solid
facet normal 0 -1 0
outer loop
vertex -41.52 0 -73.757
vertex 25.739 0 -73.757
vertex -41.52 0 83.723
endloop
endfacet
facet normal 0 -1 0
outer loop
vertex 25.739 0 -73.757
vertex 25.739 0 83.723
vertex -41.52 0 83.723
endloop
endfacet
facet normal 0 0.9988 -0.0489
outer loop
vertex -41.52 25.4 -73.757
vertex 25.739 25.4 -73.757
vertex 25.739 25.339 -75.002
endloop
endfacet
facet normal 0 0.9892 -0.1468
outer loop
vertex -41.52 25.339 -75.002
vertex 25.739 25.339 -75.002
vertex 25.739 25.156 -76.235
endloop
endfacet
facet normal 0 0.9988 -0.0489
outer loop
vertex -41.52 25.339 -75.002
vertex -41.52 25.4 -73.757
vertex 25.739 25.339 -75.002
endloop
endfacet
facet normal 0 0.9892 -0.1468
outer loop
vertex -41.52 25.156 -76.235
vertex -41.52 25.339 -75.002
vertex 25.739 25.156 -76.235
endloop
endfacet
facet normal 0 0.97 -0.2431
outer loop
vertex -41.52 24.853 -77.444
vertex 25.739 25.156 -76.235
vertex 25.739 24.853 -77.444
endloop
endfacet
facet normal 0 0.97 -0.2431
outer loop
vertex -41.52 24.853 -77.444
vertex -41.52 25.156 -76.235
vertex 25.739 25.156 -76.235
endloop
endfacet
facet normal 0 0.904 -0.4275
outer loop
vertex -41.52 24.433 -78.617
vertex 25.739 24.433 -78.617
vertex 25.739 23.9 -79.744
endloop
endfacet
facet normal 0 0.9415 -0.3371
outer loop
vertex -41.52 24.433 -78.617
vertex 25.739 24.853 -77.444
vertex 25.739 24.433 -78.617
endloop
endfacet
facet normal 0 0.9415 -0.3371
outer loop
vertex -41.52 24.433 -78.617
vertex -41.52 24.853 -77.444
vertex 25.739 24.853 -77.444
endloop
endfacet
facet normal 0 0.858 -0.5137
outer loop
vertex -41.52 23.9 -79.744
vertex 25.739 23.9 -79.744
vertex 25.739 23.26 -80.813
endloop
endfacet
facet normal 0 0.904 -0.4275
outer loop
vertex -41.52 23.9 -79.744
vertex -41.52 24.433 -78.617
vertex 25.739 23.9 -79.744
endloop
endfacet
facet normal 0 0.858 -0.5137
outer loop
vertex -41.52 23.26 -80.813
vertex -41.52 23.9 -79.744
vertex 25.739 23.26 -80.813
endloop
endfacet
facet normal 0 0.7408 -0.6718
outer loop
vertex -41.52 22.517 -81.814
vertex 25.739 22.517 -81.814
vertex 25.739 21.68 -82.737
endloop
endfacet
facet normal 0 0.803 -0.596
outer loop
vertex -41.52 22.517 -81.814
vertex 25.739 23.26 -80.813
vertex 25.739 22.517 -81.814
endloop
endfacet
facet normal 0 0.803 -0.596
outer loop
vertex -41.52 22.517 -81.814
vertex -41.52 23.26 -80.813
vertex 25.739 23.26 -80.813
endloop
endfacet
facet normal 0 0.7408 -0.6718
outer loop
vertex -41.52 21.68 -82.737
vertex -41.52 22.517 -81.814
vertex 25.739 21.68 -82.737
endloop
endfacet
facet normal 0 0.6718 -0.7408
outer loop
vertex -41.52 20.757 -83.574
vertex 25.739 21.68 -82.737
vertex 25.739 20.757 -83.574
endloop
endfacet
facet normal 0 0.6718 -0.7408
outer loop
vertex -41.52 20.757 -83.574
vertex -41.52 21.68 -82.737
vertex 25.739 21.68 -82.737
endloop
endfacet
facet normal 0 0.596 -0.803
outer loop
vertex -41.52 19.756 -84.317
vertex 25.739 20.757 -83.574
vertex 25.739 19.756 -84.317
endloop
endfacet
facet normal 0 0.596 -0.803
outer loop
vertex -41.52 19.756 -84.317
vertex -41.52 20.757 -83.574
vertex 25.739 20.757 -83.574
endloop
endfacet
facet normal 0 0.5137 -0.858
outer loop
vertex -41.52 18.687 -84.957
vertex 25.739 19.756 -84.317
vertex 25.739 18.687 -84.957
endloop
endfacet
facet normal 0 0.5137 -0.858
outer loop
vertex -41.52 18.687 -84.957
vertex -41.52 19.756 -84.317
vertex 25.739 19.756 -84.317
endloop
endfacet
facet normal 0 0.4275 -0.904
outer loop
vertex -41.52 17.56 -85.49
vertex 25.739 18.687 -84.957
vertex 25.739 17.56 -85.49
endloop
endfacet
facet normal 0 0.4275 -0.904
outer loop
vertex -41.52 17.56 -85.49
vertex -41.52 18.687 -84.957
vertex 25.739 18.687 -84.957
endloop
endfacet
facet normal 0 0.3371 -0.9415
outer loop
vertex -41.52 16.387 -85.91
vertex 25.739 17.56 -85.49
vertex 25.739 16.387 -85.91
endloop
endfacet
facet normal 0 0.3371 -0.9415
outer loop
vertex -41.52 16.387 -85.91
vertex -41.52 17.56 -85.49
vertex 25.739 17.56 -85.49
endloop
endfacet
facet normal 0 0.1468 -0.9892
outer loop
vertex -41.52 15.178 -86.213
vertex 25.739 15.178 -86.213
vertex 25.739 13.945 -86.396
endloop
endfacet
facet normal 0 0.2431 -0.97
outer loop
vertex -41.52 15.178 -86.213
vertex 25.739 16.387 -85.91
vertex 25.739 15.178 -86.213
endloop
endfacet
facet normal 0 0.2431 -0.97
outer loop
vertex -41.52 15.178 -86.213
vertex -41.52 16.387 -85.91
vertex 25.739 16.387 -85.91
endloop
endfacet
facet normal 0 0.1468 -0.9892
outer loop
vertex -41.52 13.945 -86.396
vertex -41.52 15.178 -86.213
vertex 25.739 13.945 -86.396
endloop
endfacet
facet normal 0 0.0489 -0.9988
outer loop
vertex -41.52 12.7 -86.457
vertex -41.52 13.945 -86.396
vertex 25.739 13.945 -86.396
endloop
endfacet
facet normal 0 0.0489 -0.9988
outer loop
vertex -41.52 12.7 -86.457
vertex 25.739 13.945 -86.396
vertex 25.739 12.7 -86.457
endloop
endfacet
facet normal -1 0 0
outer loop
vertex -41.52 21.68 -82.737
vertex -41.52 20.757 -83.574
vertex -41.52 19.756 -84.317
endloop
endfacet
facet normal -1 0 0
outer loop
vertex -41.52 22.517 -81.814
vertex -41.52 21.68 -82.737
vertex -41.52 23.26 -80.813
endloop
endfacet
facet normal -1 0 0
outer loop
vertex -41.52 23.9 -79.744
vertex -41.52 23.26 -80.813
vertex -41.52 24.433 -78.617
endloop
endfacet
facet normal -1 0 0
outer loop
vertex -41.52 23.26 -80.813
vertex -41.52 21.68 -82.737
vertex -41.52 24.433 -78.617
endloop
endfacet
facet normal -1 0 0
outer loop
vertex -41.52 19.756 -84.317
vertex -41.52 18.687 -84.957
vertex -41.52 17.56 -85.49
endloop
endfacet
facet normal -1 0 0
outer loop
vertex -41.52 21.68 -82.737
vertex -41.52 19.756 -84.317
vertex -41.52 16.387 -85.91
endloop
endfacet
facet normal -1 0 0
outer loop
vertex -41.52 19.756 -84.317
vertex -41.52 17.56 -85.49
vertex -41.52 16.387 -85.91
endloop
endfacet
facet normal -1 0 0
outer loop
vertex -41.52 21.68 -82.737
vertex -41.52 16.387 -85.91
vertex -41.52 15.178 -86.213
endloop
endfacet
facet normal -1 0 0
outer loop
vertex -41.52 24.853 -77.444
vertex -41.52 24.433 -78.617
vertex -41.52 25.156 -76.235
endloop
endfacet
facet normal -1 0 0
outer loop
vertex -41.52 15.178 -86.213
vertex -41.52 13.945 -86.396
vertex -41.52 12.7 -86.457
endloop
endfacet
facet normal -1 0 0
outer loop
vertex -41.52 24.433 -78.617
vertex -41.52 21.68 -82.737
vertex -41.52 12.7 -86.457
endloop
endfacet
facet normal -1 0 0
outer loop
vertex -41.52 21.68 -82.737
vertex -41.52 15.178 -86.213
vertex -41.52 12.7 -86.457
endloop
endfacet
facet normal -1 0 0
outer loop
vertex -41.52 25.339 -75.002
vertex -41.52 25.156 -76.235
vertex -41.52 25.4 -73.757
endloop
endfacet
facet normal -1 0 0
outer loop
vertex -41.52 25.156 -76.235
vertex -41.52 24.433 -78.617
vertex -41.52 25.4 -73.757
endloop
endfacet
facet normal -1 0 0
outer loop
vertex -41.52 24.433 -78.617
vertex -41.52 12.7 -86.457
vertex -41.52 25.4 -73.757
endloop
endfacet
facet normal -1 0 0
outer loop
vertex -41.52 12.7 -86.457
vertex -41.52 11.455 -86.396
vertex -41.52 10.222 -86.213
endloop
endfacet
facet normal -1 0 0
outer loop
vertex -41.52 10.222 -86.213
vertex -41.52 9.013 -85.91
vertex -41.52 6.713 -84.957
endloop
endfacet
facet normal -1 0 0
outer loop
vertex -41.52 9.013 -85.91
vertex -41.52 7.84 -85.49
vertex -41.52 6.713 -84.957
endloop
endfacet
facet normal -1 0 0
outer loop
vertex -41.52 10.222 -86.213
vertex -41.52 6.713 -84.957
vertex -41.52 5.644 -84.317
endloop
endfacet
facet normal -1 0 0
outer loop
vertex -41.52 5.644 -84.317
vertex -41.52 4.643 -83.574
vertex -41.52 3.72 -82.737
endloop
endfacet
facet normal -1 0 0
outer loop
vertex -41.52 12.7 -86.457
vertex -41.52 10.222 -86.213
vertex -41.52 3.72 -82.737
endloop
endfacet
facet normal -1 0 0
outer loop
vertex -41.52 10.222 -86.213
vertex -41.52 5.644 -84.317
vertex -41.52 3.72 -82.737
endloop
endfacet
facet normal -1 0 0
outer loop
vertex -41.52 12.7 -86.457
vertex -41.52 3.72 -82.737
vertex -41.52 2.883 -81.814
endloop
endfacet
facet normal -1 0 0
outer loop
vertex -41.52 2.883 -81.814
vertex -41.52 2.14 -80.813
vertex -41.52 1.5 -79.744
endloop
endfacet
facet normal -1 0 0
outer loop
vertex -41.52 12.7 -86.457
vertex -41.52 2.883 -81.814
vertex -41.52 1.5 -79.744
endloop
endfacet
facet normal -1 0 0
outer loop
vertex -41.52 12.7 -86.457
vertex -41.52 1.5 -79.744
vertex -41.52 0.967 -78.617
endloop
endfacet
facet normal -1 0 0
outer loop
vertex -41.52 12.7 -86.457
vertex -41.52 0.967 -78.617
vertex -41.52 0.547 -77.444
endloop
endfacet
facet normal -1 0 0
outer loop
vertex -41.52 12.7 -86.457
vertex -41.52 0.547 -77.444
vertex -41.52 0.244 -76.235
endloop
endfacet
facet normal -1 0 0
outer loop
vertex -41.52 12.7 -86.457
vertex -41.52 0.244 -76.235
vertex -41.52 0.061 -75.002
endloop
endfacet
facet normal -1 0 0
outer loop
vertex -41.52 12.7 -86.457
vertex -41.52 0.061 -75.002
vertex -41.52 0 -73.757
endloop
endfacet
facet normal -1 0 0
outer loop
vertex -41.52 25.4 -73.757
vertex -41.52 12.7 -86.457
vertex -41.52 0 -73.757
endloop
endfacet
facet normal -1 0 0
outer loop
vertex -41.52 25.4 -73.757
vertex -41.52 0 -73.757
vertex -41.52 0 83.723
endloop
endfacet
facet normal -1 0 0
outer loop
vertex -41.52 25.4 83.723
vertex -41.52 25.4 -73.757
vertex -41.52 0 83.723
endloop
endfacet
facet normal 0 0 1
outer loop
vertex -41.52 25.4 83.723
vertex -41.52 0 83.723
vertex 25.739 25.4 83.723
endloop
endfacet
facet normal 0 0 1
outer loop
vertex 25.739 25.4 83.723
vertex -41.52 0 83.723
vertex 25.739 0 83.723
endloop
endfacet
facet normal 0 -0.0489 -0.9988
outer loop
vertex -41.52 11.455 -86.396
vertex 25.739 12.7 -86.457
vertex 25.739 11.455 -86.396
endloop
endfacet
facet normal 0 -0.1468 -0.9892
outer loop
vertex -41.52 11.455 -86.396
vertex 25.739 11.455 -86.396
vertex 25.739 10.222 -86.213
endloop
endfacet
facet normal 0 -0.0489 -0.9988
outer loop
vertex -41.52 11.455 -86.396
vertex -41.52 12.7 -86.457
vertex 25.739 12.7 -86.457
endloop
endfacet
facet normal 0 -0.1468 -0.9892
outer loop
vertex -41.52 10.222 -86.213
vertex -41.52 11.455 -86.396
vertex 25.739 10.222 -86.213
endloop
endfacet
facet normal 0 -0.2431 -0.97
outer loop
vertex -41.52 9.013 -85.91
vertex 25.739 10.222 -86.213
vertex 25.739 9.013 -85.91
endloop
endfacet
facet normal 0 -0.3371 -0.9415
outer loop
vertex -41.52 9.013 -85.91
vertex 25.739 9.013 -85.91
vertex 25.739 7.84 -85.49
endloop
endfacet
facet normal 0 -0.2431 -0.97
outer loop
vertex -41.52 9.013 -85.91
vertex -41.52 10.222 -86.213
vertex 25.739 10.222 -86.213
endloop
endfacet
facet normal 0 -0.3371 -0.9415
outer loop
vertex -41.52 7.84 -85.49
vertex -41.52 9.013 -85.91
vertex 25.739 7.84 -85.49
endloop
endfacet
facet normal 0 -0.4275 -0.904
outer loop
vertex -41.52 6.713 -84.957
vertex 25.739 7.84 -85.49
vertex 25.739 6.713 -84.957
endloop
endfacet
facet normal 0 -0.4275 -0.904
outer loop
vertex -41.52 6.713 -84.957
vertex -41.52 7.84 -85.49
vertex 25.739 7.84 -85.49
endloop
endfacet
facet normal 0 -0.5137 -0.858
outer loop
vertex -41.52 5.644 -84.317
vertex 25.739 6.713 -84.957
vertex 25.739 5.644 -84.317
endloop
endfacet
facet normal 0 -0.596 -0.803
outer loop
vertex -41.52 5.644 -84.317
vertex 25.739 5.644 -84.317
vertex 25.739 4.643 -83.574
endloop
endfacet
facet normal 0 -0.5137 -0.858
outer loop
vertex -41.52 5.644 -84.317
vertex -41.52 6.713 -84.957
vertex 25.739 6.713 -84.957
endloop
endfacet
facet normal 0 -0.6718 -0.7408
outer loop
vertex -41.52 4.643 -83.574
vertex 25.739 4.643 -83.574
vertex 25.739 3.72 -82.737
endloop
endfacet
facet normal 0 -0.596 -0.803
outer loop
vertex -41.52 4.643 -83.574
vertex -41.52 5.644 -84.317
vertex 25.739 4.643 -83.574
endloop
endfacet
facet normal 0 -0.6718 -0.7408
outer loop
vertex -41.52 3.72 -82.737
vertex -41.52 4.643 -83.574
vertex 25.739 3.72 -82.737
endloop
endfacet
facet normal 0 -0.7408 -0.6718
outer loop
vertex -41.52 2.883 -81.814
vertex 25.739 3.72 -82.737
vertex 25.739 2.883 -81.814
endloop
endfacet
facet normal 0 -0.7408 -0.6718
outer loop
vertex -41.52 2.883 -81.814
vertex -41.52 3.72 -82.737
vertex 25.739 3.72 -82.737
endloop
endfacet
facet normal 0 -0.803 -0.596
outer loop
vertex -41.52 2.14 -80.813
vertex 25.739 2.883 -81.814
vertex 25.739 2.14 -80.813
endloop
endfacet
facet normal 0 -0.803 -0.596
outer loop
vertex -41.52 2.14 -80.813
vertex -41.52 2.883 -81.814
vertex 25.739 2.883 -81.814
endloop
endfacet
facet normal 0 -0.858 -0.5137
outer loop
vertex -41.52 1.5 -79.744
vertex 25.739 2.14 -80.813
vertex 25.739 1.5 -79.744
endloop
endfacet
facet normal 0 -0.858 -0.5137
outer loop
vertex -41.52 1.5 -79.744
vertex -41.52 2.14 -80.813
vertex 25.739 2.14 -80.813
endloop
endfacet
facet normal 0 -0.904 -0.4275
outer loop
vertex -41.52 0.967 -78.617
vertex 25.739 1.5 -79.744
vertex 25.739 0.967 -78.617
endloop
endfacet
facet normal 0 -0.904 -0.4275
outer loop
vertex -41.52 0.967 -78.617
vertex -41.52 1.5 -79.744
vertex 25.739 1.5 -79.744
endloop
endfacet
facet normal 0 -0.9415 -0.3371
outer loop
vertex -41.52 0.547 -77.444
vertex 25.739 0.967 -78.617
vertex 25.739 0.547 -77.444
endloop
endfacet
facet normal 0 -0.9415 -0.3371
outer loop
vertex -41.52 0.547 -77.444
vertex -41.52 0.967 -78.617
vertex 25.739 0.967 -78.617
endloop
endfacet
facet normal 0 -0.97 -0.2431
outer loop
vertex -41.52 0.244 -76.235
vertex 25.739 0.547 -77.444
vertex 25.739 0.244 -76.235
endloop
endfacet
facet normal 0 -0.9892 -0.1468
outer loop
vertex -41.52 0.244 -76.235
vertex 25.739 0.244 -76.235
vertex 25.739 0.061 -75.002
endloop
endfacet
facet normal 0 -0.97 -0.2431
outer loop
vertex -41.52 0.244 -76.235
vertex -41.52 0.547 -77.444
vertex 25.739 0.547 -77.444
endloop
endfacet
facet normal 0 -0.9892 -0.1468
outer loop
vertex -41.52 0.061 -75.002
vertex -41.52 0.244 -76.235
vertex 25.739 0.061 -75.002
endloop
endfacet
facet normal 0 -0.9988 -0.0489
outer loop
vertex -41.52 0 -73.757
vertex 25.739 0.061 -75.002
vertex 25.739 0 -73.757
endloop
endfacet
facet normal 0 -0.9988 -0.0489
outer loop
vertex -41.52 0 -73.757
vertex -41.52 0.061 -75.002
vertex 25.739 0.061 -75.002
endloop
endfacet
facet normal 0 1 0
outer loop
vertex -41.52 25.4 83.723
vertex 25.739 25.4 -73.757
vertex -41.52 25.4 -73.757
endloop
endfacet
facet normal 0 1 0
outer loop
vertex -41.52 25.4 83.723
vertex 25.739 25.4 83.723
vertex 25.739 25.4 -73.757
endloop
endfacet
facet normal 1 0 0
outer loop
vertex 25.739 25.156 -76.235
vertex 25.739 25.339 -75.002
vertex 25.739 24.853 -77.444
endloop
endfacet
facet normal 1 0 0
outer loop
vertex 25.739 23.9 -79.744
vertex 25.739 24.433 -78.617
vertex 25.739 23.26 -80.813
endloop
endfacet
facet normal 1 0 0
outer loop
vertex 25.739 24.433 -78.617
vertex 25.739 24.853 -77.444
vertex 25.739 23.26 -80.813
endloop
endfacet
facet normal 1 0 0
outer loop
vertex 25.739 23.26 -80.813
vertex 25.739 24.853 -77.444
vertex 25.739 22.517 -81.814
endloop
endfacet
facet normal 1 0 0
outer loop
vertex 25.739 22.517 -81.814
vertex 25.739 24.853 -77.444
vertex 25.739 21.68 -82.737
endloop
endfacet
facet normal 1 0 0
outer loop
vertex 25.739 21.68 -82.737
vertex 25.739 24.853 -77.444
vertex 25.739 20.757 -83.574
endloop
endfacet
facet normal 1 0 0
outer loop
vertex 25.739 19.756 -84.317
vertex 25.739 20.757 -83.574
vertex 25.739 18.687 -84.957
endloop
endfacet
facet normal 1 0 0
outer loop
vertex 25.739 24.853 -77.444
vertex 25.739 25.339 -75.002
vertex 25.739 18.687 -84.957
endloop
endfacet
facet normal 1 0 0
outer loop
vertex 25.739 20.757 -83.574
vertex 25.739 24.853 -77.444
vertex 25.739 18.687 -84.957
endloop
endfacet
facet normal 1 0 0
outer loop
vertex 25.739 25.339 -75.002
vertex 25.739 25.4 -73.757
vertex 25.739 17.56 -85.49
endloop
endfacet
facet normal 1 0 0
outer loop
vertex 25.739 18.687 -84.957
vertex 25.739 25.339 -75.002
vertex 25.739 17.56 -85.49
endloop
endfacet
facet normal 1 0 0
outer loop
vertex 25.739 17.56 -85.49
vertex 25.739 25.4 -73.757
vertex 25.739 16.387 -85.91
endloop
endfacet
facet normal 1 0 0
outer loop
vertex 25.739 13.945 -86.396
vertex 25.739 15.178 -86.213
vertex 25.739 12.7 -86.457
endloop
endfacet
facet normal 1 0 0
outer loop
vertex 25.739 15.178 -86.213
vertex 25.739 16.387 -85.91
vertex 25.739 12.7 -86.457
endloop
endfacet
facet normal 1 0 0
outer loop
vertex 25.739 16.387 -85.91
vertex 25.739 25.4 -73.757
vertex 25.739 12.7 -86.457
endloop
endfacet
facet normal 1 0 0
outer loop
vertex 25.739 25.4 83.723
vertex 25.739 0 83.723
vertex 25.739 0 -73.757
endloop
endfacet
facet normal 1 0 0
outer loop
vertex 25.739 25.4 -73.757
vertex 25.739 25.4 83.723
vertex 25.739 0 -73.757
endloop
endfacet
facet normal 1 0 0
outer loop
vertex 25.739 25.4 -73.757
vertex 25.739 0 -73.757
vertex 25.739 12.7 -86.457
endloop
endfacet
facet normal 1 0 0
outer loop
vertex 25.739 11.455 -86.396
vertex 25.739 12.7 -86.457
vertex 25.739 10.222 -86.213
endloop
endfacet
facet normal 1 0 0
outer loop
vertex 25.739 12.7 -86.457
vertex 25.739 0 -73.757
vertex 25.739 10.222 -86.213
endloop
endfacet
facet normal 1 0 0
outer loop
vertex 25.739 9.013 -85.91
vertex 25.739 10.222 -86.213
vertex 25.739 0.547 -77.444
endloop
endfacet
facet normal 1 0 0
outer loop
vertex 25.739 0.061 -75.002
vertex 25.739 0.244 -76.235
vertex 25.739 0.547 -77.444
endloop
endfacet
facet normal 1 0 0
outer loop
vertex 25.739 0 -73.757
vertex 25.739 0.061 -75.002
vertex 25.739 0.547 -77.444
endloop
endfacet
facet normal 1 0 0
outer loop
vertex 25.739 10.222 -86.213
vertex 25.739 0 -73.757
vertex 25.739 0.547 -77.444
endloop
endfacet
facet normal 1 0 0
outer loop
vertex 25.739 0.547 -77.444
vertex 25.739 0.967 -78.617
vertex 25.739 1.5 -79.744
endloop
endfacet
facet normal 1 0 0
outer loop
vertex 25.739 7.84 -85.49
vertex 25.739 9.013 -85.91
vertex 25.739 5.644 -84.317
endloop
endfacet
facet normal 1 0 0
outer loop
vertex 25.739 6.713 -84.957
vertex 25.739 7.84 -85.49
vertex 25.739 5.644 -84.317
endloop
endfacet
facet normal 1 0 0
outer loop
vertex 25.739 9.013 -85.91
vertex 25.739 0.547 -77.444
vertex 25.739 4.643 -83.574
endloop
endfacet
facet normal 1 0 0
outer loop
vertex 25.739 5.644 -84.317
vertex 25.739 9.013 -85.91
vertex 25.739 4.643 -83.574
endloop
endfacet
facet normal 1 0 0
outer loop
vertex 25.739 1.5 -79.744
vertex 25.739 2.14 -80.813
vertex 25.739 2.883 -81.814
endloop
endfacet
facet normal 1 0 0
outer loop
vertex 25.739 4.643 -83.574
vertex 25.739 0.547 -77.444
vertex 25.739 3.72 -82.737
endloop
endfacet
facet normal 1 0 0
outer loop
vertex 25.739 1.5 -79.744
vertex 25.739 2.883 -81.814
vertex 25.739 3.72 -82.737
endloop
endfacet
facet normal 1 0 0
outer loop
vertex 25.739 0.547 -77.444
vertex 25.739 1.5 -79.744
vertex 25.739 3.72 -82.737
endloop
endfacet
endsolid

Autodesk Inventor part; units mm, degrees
ref_plane "YZ Plane" through (0, 0, 0) normal (1, 0, 0) x (0, 1, 0)
ref_plane "XZ Plane" through (0, 0, 0) normal (0, 1, 0) x (-1, 0, 0)
ref_plane "XY Plane" through (0, 0, 0) normal (0, 0, 1) x (1, 0, 0)
sketch "Sketch1" plane through (0, 0, 0) normal (0, 1, 0) x (-1, 0, 0)
  line L0 (41.5198, 83.7231) -> (-25.7394, 83.7231)
  line L1 (-25.7394, 83.7231) -> (-25.7394, -86.4569)
  line L2 (-25.7394, -86.4569) -> (41.5198, -86.4569)
  line L3 (41.5198, -86.4569) -> (41.5198, 83.7231)
  point P0 (0, 0)
  dimension "d0" = 170.18
  dimension "d1" = 67.2592
extrude "Extrusion1" add sketch "Sketch1" along normal blind 25.4
fillet "Fillet1" radius 12.7 2 edges at (-7.8902, 25.4, -86.4569) (-7.8902, 0, -86.4569)
properties part number "Battery"
